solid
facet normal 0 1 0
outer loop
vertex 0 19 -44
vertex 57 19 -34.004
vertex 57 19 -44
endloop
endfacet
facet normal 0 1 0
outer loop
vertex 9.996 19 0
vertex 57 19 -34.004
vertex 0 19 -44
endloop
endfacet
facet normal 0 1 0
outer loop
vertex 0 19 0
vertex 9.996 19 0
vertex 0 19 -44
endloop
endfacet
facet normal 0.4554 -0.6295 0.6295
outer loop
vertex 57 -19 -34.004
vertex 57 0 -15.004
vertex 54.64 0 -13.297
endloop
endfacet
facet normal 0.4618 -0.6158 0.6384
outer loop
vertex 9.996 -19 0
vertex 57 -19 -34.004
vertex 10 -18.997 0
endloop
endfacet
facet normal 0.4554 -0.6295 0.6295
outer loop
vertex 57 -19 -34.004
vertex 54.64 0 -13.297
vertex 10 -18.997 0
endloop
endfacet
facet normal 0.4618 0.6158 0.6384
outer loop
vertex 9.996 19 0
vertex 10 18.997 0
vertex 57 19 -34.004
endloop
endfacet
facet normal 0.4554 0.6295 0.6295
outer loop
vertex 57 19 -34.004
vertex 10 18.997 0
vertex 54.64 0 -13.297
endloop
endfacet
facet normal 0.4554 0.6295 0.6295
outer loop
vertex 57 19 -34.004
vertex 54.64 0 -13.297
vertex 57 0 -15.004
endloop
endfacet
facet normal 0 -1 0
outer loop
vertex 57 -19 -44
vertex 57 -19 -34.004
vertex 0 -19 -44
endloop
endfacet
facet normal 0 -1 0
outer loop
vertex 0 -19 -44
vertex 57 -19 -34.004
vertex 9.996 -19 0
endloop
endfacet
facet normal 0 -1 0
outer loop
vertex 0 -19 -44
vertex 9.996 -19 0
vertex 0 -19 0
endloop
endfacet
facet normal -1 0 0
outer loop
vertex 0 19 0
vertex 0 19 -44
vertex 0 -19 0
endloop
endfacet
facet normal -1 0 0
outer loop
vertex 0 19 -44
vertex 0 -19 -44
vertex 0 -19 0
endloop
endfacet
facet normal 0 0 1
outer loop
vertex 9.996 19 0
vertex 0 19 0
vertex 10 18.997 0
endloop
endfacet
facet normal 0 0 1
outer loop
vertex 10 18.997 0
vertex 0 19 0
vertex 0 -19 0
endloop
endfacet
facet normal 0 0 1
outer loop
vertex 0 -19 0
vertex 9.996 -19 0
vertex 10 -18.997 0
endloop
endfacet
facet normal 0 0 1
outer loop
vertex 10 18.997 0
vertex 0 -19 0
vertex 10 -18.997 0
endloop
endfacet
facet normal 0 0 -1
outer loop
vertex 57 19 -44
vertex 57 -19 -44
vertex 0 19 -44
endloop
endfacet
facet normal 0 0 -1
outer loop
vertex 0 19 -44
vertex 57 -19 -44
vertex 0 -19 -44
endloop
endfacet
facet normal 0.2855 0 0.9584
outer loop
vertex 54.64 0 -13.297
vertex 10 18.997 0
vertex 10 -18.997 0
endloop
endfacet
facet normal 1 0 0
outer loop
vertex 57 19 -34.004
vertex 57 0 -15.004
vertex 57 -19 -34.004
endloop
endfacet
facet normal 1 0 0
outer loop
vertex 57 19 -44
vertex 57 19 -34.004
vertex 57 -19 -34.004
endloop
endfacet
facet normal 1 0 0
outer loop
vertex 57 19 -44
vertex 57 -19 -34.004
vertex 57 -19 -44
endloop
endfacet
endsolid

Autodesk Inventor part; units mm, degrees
ref_plane "YZ Plane" through (0, 0, 0) normal (1, 0, 0) x (0, 1, 0)
ref_plane "XZ Plane" through (0, 0, 0) normal (0, 1, 0) x (-1, 0, 0)
sketch "草圖1" plane through (0, 0, 0) normal (0, 1, 0) x (-1, 0, 0)
  line L0 (0, 0) -> (-57, 0)
  line L1 (-57, 0) -> (-57, -44)
  line L2 (-57, -44) -> (0, -44)
  line L3 (0, -44) -> (0, 0)
  dimension "d0" = 57
  dimension "d1" = 44
extrude "擠出1" add sketch "草圖1" along normal mid plane 38
sketch "草圖2" plane through (0, 19, 0) normal (0, 1, 0) x (1, 0, 0)
  line L0 (0, 0) -> (57, 0) projected
  line L1 (10, 0) -> (57, 14)
  line L2 (57, 0) -> (57, 44) projected
  dimension "d4" = 10
  dimension "d5" = 30
extrude "擠出2" cut sketch "草圖2" against normal blind 40
sketch "草圖3" plane through (57, -19, -44) normal (1, 0, 0) x (0, 0, -1)
  line L0 (-30, 18) -> (-10, 38)
  line L1 (0, 38) -> (-44, 38) projected
  line L2 (-30, 38) -> (-30, 0) projected
  point P0 (-44, 19)
  dimension "d8" = 20
  dimension "d9" = 20
ref_plane "工作平面1" through (10, 19, 0) normal (-0.4554, -0.6295, -0.6295) x (0.8102, 0, -0.5861)
sketch "草圖4" plane through (10, 19, 0) normal (-0.4554, -0.6295, -0.6295) x (0.8102, 0, -0.5861)
  line L0 (-15.1543, -12.3218) -> (93.717, -12.3218)
  line L1 (93.717, -12.3218) -> (93.717, 28.8166)
  line L2 (93.717, 28.8166) -> (-15.1543, 28.8166)
  line L3 (-15.1543, 28.8166) -> (-15.1543, -12.3218)
  point P0 (-8.1022, 11.0728)
extrude "擠出3" cut sketch "草圖4" against normal blind 40
mirror "鏡射1" about plane through (0, 0, 0) normal (0, 1, 0) of "擠出3"
properties part number "42"
